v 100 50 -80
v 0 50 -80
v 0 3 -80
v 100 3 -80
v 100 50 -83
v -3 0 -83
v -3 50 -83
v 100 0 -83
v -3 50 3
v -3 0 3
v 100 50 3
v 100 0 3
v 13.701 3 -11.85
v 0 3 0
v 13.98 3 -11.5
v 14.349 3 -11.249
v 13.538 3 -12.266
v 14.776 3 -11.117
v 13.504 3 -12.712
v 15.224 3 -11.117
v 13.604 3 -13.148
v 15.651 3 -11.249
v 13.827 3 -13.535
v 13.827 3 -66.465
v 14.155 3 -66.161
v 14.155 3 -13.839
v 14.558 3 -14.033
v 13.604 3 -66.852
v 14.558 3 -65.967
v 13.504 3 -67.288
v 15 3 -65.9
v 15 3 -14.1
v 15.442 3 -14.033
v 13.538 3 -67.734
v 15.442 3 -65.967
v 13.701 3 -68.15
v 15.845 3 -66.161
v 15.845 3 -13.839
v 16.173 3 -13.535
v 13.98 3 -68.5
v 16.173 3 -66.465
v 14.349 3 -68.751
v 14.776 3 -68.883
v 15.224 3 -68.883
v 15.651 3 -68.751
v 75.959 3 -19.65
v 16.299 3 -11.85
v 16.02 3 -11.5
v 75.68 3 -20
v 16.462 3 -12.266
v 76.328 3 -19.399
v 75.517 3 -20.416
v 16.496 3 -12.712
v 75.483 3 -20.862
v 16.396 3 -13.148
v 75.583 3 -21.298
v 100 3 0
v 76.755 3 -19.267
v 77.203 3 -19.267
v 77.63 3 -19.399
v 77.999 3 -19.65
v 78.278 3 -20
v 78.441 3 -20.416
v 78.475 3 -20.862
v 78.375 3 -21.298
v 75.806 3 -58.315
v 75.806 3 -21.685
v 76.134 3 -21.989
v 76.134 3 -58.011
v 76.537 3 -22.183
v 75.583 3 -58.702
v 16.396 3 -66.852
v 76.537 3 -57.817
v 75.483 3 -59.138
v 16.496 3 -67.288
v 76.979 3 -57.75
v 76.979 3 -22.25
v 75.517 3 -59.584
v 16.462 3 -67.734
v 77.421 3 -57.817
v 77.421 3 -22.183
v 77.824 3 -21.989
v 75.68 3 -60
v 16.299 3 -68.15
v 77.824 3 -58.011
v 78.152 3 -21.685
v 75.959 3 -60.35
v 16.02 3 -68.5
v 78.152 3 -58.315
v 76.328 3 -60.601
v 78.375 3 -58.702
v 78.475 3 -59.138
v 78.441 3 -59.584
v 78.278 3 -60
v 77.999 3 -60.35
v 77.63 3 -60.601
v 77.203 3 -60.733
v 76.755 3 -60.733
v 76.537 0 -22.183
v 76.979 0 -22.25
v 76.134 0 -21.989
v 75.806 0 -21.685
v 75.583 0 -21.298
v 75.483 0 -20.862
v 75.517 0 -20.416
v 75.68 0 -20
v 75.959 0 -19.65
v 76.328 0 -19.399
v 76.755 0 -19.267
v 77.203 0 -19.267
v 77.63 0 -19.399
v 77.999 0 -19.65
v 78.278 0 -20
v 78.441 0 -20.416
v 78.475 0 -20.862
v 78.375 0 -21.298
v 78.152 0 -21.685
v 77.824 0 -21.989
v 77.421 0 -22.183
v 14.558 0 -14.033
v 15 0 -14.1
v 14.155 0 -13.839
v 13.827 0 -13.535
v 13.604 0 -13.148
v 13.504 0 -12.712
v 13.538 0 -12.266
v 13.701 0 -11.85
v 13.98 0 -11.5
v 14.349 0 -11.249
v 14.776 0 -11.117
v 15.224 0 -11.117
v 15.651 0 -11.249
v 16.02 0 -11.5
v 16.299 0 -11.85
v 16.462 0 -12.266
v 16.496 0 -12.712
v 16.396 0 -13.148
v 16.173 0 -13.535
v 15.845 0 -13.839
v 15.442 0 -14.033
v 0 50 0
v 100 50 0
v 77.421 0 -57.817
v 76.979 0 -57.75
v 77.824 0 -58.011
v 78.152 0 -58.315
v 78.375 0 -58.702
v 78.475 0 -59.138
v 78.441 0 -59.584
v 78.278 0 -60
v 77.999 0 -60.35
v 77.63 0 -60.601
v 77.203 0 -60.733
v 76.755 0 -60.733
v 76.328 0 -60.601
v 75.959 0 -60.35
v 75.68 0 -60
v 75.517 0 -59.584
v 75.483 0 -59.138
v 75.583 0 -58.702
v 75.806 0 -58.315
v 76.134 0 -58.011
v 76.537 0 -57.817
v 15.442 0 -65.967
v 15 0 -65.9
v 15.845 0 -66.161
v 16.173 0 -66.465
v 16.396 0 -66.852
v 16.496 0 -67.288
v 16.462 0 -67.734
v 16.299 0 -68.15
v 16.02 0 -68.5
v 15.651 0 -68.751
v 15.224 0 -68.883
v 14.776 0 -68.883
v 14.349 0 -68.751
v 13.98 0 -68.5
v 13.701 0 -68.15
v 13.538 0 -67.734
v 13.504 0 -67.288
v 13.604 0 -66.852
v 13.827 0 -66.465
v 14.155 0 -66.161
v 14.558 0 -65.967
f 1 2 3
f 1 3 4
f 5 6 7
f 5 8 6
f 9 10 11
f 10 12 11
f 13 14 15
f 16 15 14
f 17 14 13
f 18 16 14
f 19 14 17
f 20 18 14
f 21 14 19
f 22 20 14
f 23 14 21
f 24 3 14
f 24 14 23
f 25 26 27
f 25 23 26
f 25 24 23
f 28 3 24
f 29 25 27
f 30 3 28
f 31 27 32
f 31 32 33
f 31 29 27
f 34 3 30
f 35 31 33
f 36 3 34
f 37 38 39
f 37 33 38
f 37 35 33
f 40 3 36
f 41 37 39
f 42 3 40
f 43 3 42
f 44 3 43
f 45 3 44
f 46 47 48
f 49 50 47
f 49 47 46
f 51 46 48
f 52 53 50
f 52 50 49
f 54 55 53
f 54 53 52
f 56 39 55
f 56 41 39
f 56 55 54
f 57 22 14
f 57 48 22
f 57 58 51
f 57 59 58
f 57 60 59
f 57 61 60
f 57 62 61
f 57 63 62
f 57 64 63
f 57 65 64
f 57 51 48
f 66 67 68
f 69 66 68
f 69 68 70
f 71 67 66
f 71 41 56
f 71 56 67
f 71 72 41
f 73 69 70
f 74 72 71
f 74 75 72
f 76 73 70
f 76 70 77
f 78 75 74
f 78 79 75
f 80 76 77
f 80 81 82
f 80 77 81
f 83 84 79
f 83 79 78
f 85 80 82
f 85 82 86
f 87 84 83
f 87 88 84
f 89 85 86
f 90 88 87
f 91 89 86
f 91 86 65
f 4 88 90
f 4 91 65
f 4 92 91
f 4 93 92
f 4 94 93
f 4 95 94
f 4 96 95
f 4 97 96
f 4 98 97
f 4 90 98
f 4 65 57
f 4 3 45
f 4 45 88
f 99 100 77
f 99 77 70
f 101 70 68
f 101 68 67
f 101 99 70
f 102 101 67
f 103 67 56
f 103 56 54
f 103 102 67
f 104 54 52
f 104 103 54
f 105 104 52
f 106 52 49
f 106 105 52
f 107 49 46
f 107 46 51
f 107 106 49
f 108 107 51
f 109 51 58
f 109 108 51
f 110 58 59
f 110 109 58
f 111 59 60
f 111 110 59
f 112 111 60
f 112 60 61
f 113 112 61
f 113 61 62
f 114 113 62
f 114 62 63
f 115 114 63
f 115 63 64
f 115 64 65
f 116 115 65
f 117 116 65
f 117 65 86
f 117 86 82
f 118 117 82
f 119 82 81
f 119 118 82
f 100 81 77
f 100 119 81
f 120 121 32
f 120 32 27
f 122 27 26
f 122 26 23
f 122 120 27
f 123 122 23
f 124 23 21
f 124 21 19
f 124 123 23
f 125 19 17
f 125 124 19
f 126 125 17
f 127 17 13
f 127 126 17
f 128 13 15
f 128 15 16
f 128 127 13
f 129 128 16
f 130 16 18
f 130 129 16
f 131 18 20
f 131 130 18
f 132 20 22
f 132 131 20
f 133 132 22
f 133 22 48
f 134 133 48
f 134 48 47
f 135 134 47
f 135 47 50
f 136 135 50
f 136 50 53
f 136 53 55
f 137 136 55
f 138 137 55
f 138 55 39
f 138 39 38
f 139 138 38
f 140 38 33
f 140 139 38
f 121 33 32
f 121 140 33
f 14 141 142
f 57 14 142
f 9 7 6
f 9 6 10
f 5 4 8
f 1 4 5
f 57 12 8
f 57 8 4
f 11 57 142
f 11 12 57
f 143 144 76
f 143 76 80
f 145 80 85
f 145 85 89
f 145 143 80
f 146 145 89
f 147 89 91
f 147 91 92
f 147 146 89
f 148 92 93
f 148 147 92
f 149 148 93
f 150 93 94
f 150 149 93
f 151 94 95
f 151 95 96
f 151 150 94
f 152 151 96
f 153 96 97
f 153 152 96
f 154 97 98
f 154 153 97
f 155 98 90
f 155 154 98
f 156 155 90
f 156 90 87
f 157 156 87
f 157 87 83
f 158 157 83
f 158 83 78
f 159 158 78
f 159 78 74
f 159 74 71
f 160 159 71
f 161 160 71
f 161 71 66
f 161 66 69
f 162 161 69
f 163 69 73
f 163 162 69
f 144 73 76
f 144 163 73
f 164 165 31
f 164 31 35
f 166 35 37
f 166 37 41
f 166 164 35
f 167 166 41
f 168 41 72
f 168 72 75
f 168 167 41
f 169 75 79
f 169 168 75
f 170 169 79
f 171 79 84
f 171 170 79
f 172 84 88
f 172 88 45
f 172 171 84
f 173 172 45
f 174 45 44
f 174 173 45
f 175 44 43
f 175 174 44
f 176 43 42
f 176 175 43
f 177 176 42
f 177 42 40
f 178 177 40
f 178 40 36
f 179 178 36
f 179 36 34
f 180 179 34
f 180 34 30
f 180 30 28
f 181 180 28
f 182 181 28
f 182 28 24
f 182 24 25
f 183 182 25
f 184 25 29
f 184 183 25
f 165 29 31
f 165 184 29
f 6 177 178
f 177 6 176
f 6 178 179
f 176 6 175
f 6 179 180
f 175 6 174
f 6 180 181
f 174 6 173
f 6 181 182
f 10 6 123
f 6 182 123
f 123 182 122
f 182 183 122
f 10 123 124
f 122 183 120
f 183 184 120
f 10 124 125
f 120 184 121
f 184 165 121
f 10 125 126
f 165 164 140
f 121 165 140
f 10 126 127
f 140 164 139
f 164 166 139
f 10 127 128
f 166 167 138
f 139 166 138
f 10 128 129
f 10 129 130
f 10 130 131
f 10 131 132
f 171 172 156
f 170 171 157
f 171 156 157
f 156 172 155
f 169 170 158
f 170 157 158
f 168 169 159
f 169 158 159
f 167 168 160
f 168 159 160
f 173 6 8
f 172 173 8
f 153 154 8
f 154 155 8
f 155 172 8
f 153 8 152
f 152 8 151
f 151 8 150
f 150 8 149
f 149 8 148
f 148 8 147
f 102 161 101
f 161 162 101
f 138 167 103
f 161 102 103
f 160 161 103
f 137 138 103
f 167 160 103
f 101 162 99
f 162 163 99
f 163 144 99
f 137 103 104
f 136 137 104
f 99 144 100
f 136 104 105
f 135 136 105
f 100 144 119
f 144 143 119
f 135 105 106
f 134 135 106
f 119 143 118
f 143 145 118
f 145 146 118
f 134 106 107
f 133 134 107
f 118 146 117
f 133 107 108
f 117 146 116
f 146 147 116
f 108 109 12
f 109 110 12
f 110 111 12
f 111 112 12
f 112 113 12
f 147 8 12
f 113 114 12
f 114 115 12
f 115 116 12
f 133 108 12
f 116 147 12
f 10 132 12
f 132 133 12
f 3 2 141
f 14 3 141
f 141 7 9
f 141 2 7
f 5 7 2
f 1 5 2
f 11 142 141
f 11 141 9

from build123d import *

# Parameters (mm, degrees)
SCHIZZO1_W                   = 100
SCHIZZO1_H                   = 80
SCHIZZO1_R                   = 1.5
ESTRUSIONE_ESTRUSIONE1_DEPTH = 3
SCHIZZO2_W                   = 100
SCHIZZO2_H                   = 50
ESTRUSIONE_ESTRUSIONE2_DEPTH = 3
SCHIZZO3_W                   = 86
SCHIZZO3_H                   = 50
ESTRUSIONE_ESTRUSIONE3_DEPTH = 3


with BuildPart() as part:
    # Schizzo1 → Estrusione-Estrusione1 (new body)
    with BuildSketch(Plane(origin=(0, 0, 0), x_dir=(1, 0, 0), z_dir=(0, 1, 0))):
        with Locations((50, 40)):
            Rectangle(SCHIZZO1_W, SCHIZZO1_H)
        with Locations(Location((15, 67.4, 0), (0, 0, 270))):
            Circle(SCHIZZO1_R, mode=Mode.SUBTRACT)
        with Locations(Location((15, 12.6, 0), (0, 0, 90))):
            Circle(SCHIZZO1_R, mode=Mode.SUBTRACT)
        with Locations(Location((76.978953205, 59.25, 0), (0, 0, 270))):
            Circle(SCHIZZO1_R, mode=Mode.SUBTRACT)
        with Locations(Location((76.978953205, 20.75, 0), (0, 0, 90))):
            Circle(SCHIZZO1_R, mode=Mode.SUBTRACT)
    extrude(amount=ESTRUSIONE_ESTRUSIONE1_DEPTH)

    # Schizzo2 → Estrusione-Estrusione2 (add)
    with BuildSketch(Plane.XY):
        with Locations((50, 25)):
            Rectangle(SCHIZZO2_W, SCHIZZO2_H)
    estrusione_estrusione2 = extrude(amount=ESTRUSIONE_ESTRUSIONE2_DEPTH)

    # Specchia1: Estrusione-Estrusione2 across plane
    add(estrusione_estrusione2.mirror(Plane.XY.offset(-40)))

    # Schizzo3 → Estrusione-Estrusione3 (add)
    with BuildSketch(Plane.ZY):
        with Locations((-40, 25)):
            Rectangle(SCHIZZO3_W, SCHIZZO3_H)
    extrude(amount=ESTRUSIONE_ESTRUSIONE3_DEPTH)


solid = part.part
